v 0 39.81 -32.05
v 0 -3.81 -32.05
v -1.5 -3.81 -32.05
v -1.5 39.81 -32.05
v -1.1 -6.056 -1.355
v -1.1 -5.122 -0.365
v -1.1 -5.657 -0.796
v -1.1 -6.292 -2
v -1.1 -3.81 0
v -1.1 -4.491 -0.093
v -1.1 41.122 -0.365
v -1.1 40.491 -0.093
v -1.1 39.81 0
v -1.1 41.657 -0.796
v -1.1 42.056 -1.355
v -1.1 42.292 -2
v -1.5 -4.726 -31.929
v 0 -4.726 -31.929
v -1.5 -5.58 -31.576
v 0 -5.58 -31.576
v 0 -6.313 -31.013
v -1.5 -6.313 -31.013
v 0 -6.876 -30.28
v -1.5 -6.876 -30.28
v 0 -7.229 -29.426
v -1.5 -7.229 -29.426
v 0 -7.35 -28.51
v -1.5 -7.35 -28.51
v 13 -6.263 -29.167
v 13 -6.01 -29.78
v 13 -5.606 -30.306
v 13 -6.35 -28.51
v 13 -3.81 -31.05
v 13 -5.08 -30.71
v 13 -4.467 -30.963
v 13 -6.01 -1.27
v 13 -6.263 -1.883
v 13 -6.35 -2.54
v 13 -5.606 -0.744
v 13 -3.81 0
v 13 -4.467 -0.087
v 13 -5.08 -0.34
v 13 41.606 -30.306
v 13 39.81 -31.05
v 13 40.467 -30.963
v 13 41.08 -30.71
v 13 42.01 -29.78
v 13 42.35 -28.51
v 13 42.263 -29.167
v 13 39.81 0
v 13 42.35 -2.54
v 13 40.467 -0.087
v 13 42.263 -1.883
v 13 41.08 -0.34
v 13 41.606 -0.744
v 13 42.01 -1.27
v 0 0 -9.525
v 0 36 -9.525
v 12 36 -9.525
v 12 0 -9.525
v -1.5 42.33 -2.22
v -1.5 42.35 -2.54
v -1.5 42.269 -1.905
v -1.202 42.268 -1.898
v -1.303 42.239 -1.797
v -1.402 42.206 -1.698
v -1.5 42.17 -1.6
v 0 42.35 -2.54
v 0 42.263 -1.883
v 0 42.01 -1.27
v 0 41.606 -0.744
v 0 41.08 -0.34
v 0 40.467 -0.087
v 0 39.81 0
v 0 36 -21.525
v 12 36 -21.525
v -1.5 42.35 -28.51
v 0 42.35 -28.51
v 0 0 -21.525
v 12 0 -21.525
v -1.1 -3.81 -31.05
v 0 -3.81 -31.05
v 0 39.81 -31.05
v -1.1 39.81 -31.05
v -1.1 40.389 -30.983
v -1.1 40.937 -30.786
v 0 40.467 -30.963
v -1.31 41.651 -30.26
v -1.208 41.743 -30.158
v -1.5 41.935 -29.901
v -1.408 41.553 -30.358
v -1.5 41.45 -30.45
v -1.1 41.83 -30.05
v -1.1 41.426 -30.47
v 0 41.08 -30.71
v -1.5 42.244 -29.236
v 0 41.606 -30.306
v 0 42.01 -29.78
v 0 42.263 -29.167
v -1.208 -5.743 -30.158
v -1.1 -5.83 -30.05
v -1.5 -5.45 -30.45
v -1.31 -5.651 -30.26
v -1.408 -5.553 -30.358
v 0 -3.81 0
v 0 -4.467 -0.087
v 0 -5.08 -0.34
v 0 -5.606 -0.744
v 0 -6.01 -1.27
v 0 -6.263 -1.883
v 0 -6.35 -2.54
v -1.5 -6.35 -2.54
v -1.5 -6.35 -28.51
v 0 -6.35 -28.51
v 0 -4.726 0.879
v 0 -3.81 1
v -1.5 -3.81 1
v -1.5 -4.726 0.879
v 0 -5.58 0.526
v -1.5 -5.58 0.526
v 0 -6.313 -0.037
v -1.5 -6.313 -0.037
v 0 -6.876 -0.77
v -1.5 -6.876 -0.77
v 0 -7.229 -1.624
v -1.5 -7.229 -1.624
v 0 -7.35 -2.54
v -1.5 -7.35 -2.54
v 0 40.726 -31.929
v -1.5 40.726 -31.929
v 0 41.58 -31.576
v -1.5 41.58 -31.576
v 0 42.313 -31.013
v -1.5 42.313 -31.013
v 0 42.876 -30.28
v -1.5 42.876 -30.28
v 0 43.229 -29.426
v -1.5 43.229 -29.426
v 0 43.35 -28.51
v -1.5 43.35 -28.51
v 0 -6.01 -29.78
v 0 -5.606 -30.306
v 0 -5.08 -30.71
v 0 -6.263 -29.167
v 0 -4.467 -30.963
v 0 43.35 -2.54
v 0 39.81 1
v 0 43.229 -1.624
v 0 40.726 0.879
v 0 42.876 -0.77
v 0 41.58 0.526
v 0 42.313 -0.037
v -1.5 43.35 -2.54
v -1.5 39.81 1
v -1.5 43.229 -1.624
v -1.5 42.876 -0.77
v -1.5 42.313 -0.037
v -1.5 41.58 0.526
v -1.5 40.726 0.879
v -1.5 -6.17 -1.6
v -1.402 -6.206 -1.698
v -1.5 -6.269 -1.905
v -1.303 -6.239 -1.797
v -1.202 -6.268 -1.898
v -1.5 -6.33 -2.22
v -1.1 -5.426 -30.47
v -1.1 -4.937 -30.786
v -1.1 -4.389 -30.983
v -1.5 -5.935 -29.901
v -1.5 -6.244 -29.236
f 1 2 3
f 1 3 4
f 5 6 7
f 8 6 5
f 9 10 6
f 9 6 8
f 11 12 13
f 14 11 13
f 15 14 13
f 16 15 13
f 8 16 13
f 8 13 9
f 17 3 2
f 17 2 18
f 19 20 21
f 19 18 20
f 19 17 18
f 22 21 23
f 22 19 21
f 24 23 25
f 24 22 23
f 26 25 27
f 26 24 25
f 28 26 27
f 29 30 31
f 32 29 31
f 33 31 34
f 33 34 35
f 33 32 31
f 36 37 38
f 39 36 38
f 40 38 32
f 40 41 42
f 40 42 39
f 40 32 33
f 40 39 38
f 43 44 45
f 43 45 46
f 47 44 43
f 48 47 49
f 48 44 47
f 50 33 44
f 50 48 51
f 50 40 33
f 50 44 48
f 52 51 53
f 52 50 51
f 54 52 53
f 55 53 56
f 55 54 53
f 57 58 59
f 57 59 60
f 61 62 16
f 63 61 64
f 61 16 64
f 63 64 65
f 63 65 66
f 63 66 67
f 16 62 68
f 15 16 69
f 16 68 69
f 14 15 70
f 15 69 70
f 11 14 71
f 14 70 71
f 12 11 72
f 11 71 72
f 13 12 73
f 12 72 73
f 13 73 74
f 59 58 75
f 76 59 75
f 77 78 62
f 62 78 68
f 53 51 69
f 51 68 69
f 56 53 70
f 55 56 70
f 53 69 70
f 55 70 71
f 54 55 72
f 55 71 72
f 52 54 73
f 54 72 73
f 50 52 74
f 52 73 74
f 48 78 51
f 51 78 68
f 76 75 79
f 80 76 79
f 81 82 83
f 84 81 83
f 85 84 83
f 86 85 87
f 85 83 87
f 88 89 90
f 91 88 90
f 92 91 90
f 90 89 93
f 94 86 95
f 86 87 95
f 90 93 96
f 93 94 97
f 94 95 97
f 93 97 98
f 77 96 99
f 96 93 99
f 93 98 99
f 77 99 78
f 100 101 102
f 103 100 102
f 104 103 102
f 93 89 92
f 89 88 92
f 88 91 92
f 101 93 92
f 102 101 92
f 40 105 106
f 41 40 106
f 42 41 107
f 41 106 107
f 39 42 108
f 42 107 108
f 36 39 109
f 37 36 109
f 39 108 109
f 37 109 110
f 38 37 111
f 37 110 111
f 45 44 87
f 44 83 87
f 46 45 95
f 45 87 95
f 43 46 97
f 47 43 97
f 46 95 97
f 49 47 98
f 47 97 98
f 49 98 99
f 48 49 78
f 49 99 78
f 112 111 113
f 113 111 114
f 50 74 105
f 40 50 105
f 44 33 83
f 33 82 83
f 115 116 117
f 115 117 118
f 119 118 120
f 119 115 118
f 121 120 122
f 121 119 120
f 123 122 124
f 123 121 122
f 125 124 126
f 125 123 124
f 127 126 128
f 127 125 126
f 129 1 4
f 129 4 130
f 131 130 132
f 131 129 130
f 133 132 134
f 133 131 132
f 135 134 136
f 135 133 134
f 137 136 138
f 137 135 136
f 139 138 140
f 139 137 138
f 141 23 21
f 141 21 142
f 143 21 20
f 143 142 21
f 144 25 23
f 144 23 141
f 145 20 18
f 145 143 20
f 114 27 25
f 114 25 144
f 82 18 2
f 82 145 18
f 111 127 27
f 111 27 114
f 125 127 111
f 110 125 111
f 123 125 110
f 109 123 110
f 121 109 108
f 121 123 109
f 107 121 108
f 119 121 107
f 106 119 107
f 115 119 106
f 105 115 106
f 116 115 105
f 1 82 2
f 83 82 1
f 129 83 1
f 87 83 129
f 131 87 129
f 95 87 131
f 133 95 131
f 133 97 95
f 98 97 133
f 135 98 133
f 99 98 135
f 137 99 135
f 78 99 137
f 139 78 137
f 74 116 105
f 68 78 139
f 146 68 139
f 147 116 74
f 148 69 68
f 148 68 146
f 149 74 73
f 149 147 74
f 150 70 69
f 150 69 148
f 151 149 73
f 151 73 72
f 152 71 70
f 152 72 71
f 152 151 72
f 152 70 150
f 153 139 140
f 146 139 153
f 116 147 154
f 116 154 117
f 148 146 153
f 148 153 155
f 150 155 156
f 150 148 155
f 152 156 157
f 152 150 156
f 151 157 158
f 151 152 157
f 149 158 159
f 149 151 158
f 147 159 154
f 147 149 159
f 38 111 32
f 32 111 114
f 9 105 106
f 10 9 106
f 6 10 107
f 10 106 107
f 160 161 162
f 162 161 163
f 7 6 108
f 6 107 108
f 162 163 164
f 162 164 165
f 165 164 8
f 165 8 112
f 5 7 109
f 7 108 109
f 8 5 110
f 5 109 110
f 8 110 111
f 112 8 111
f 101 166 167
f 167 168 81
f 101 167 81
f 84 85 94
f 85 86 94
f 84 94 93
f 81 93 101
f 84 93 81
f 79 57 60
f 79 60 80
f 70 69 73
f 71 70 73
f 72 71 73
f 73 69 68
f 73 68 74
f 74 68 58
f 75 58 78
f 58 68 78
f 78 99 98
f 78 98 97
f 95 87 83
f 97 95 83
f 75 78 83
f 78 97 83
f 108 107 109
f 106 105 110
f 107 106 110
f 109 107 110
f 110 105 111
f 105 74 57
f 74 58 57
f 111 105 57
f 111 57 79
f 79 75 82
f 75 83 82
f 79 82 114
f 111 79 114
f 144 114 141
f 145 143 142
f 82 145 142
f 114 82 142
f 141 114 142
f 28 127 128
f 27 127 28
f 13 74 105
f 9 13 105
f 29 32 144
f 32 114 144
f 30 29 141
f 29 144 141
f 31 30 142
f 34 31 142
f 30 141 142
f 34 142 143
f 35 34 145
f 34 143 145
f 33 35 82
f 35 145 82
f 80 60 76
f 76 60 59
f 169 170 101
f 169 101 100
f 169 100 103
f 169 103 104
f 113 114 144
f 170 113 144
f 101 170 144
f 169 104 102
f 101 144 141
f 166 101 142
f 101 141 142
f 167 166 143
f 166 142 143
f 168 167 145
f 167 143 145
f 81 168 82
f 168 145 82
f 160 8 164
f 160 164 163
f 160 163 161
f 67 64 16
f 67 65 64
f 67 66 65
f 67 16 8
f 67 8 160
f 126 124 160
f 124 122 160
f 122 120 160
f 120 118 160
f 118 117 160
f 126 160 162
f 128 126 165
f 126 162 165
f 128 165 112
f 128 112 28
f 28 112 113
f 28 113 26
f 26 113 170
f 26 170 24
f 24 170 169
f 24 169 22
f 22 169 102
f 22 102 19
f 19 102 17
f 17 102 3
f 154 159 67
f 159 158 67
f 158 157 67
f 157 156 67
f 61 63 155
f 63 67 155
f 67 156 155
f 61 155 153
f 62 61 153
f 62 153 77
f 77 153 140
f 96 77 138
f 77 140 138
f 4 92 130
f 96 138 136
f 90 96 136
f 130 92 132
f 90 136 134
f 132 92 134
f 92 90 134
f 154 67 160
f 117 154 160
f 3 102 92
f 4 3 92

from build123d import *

# Parameters (mm, degrees)
SKETCH2_W                        = 36
SKETCH2_H                        = 12
BOSS_EXTRUDE2_DEPTH              = 12
BOSS_EXTRUDE3_DEPTH              = 1
BOSS_EXTRUDE5_DEPTH              = 1.5
BOSS_EXTRUDE10_REACH             = 44.882
BOSS_EXTRUDE10_DIRECTION_2_REACH = 44.882
SKETCH15_OUTSIDE_W               = 65.146
SKETCH15_OUTSIDE_H               = 47.496
CUT_OFF_EXTRA_EDGES_DEPTH        = 47


with BuildPart() as part:
    # Sketch2 → Boss-Extrude2 (new body)
    with BuildSketch(Plane(origin=(0, 0, 0), x_dir=(0, -1, 0), z_dir=(1, 0, 0))):
        with BuildLine():
            Line((6.35, 2.54), (6.35, 28.51))
            ThreePointArc((6.35, 28.51), (5.606051224, 30.306051224), (3.81, 31.05))
            Line((3.81, 31.05), (-39.81, 31.05))
            ThreePointArc((-39.81, 31.05), (-41.606051224, 30.306051224), (-42.35, 28.51))
            Line((-42.35, 28.51), (-42.35, 2.54))
            ThreePointArc((-42.35, 2.54), (-41.606051224, 0.743948776), (-39.81, 0))
            Line((-39.81, 0), (3.81, 0))
            ThreePointArc((3.81, 0), (5.606051224, 0.743948776), (6.35, 2.54))
        make_face()
        with Locations((-18, 15.525)):
            Rectangle(SKETCH2_W, SKETCH2_H, mode=Mode.SUBTRACT)
    extrude(amount=BOSS_EXTRUDE2_DEPTH)

    # Sketch3 → Boss-Extrude3 (add)
    with BuildSketch(Plane.YZ.offset(12)):
        with BuildLine():
            Line((-6.35, -2.54), (-6.35, -28.51))
            ThreePointArc((-6.35, -28.51), (-5.606051224, -30.306051224), (-3.81, -31.05))
            Line((-3.81, -31.05), (39.81, -31.05))
            ThreePointArc((39.81, -31.05), (41.606051224, -30.306051224), (42.35, -28.51))
            Line((42.35, -28.51), (42.35, -2.54))
            ThreePointArc((42.35, -2.54), (41.606051224, -0.743948776), (39.81, 0))
            Line((39.81, 0), (-3.81, 0))
            ThreePointArc((-3.81, 0), (-5.606051224, -0.743948776), (-6.35, -2.54))
        make_face()
    extrude(amount=BOSS_EXTRUDE3_DEPTH)


with BuildPart() as body_2:
    # Sketch6 → Boss-Extrude5 (new body)
    with BuildSketch(Plane(origin=(0, 0, 0), x_dir=(0, -1, 0), z_dir=(-1, 0, 0))):
        with BuildLine():
            Line((7.35, -2.54), (7.35, -28.51))
            ThreePointArc((7.35, -28.51), (6.313158005, -31.013158005), (3.81, -32.05))
            Line((3.81, -32.05), (-39.81, -32.05))
            ThreePointArc((-39.81, -32.05), (-42.313158005, -31.013158005), (-43.35, -28.51))
            Line((-43.35, -28.51), (-43.35, -2.54))
            ThreePointArc((-43.35, -2.54), (-42.313158005, -0.036841995), (-39.81, 1))
            Line((-39.81, 1), (3.81, 1))
            ThreePointArc((3.81, 1), (6.313158005, -0.036841995), (7.35, -2.54))
        make_face()
        with BuildLine():
            Line((6.35, -2.54), (6.35, -28.51))
            ThreePointArc((6.35, -28.51), (5.606051224, -30.306051224), (3.81, -31.05))
            Line((3.81, -31.05), (-39.81, -31.05))
            ThreePointArc((-39.81, -31.05), (-41.606051224, -30.306051224), (-42.35, -28.51))
            Line((-42.35, -28.51), (-42.35, -2.54))
            ThreePointArc((-42.35, -2.54), (-41.606051224, -0.743948776), (-39.81, 0))
            Line((-39.81, 0), (3.81, 0))
            ThreePointArc((3.81, 0), (5.606051224, -0.743948776), (6.35, -2.54))
        make_face(mode=Mode.SUBTRACT)
    extrude(amount=BOSS_EXTRUDE5_DEPTH)

    # Boss-Extrude10: up to this face of the body (flat: up to its plane)
    boss_extrude10_end = Plane(body_2.part.faces().sort_by_distance((-0.75, 42.35, -15.525))[0])
    # Sketch10 → Boss-Extrude10 (add, up to the picked face)
    with BuildSketch(Plane(origin=(0, 18, 0), x_dir=(1, 0, 0), z_dir=(0, 1, 0)), mode=Mode.PRIVATE) as boss_extrude10_sk1:
        Polygon((-1.1, 0), (-1.1, 2), (-1.5, 1.6), (-1.5, 0), align=None)
    boss_extrude10_tool1 = split(extrude(boss_extrude10_sk1.sketch, amount=BOSS_EXTRUDE10_REACH, mode=Mode.PRIVATE), bisect_by=boss_extrude10_end, keep=Keep.BOTH, mode=Mode.PRIVATE)
    # Sketch10 → Boss-Extrude10 (add, up to the picked face)
    with BuildSketch(Plane(origin=(0, 18, 0), x_dir=(1, 0, 0), z_dir=(0, 1, 0)), mode=Mode.PRIVATE) as boss_extrude10_sk2:
        Polygon((-1.5, 31.05), (-1.1, 31.05), (-1.1, 30.05), (-1.5, 30.45), align=None)
    boss_extrude10_tool2 = split(extrude(boss_extrude10_sk2.sketch, amount=BOSS_EXTRUDE10_REACH, mode=Mode.PRIVATE), bisect_by=boss_extrude10_end, keep=Keep.BOTH, mode=Mode.PRIVATE)
    add(boss_extrude10_tool1.solids().sort_by(Axis((-1.292593, 18, -0.903704), (0, 1, 0)))[0])
    add(boss_extrude10_tool2.solids().sort_by(Axis((-1.283333, 18, -30.641667), (0, 1, 0)))[0])

    # Boss-Extrude10 direction 2: up to this face of the body (flat: up to its plane)
    boss_extrude10_direction_2_end = Plane(body_2.part.faces().sort_by_distance((-0.75, -6.35, -15.525))[0])
    # Sketch10 → Boss-Extrude10 direction 2 (add, up to the picked face)
    with BuildSketch(Plane(origin=(0, 18, 0), x_dir=(1, 0, 0), z_dir=(0, 1, 0)), mode=Mode.PRIVATE) as boss_extrude10_direction_2_sk1:
        Polygon((-1.1, 0), (-1.1, 2), (-1.5, 1.6), (-1.5, 0), align=None)
    boss_extrude10_direction_2_tool1 = split(extrude(boss_extrude10_direction_2_sk1.sketch, amount=-BOSS_EXTRUDE10_DIRECTION_2_REACH, mode=Mode.PRIVATE), bisect_by=boss_extrude10_direction_2_end, keep=Keep.BOTH, mode=Mode.PRIVATE)
    # Sketch10 → Boss-Extrude10 direction 2 (add, up to the picked face)
    with BuildSketch(Plane(origin=(0, 18, 0), x_dir=(1, 0, 0), z_dir=(0, 1, 0)), mode=Mode.PRIVATE) as boss_extrude10_direction_2_sk2:
        Polygon((-1.5, 31.05), (-1.1, 31.05), (-1.1, 30.05), (-1.5, 30.45), align=None)
    boss_extrude10_direction_2_tool2 = split(extrude(boss_extrude10_direction_2_sk2.sketch, amount=-BOSS_EXTRUDE10_DIRECTION_2_REACH, mode=Mode.PRIVATE), bisect_by=boss_extrude10_direction_2_end, keep=Keep.BOTH, mode=Mode.PRIVATE)
    add(boss_extrude10_direction_2_tool1.solids().sort_by(Axis((-1.292593, 18, -0.903704), (0, -1, 0)))[0])
    add(boss_extrude10_direction_2_tool2.solids().sort_by(Axis((-1.283333, 18, -30.641667), (0, -1, 0)))[0])

    # Sketch15 outside → cut off extra edges (cut)
    with BuildSketch(Plane(origin=(-1.5, 0, 0), x_dir=(0, -1, 0), z_dir=(-1, 0, 0))):
        with Locations((-18, -15.525)):
            Rectangle(SKETCH15_OUTSIDE_W, SKETCH15_OUTSIDE_H)
        with BuildLine():
            Line((7.35, -28.51), (7.35, -2.54))
            ThreePointArc((7.35, -2.54), (6.313158005, -0.036841995), (3.81, 1))
            Line((3.81, 1), (-39.81, 1))
            ThreePointArc((-39.81, 1), (-42.313158005, -0.036841995), (-43.35, -2.54))
            Line((-43.35, -2.54), (-43.35, -28.51))
            ThreePointArc((-43.35, -28.51), (-42.313158005, -31.013158005), (-39.81, -32.05))
            Line((-39.81, -32.05), (3.81, -32.05))
            ThreePointArc((3.81, -32.05), (6.313158005, -31.013158005), (7.35, -28.51))
        make_face(mode=Mode.SUBTRACT)
    extrude(amount=-CUT_OFF_EXTRA_EDGES_DEPTH, mode=Mode.SUBTRACT)


solid = Compound([part.part, body_2.part])
